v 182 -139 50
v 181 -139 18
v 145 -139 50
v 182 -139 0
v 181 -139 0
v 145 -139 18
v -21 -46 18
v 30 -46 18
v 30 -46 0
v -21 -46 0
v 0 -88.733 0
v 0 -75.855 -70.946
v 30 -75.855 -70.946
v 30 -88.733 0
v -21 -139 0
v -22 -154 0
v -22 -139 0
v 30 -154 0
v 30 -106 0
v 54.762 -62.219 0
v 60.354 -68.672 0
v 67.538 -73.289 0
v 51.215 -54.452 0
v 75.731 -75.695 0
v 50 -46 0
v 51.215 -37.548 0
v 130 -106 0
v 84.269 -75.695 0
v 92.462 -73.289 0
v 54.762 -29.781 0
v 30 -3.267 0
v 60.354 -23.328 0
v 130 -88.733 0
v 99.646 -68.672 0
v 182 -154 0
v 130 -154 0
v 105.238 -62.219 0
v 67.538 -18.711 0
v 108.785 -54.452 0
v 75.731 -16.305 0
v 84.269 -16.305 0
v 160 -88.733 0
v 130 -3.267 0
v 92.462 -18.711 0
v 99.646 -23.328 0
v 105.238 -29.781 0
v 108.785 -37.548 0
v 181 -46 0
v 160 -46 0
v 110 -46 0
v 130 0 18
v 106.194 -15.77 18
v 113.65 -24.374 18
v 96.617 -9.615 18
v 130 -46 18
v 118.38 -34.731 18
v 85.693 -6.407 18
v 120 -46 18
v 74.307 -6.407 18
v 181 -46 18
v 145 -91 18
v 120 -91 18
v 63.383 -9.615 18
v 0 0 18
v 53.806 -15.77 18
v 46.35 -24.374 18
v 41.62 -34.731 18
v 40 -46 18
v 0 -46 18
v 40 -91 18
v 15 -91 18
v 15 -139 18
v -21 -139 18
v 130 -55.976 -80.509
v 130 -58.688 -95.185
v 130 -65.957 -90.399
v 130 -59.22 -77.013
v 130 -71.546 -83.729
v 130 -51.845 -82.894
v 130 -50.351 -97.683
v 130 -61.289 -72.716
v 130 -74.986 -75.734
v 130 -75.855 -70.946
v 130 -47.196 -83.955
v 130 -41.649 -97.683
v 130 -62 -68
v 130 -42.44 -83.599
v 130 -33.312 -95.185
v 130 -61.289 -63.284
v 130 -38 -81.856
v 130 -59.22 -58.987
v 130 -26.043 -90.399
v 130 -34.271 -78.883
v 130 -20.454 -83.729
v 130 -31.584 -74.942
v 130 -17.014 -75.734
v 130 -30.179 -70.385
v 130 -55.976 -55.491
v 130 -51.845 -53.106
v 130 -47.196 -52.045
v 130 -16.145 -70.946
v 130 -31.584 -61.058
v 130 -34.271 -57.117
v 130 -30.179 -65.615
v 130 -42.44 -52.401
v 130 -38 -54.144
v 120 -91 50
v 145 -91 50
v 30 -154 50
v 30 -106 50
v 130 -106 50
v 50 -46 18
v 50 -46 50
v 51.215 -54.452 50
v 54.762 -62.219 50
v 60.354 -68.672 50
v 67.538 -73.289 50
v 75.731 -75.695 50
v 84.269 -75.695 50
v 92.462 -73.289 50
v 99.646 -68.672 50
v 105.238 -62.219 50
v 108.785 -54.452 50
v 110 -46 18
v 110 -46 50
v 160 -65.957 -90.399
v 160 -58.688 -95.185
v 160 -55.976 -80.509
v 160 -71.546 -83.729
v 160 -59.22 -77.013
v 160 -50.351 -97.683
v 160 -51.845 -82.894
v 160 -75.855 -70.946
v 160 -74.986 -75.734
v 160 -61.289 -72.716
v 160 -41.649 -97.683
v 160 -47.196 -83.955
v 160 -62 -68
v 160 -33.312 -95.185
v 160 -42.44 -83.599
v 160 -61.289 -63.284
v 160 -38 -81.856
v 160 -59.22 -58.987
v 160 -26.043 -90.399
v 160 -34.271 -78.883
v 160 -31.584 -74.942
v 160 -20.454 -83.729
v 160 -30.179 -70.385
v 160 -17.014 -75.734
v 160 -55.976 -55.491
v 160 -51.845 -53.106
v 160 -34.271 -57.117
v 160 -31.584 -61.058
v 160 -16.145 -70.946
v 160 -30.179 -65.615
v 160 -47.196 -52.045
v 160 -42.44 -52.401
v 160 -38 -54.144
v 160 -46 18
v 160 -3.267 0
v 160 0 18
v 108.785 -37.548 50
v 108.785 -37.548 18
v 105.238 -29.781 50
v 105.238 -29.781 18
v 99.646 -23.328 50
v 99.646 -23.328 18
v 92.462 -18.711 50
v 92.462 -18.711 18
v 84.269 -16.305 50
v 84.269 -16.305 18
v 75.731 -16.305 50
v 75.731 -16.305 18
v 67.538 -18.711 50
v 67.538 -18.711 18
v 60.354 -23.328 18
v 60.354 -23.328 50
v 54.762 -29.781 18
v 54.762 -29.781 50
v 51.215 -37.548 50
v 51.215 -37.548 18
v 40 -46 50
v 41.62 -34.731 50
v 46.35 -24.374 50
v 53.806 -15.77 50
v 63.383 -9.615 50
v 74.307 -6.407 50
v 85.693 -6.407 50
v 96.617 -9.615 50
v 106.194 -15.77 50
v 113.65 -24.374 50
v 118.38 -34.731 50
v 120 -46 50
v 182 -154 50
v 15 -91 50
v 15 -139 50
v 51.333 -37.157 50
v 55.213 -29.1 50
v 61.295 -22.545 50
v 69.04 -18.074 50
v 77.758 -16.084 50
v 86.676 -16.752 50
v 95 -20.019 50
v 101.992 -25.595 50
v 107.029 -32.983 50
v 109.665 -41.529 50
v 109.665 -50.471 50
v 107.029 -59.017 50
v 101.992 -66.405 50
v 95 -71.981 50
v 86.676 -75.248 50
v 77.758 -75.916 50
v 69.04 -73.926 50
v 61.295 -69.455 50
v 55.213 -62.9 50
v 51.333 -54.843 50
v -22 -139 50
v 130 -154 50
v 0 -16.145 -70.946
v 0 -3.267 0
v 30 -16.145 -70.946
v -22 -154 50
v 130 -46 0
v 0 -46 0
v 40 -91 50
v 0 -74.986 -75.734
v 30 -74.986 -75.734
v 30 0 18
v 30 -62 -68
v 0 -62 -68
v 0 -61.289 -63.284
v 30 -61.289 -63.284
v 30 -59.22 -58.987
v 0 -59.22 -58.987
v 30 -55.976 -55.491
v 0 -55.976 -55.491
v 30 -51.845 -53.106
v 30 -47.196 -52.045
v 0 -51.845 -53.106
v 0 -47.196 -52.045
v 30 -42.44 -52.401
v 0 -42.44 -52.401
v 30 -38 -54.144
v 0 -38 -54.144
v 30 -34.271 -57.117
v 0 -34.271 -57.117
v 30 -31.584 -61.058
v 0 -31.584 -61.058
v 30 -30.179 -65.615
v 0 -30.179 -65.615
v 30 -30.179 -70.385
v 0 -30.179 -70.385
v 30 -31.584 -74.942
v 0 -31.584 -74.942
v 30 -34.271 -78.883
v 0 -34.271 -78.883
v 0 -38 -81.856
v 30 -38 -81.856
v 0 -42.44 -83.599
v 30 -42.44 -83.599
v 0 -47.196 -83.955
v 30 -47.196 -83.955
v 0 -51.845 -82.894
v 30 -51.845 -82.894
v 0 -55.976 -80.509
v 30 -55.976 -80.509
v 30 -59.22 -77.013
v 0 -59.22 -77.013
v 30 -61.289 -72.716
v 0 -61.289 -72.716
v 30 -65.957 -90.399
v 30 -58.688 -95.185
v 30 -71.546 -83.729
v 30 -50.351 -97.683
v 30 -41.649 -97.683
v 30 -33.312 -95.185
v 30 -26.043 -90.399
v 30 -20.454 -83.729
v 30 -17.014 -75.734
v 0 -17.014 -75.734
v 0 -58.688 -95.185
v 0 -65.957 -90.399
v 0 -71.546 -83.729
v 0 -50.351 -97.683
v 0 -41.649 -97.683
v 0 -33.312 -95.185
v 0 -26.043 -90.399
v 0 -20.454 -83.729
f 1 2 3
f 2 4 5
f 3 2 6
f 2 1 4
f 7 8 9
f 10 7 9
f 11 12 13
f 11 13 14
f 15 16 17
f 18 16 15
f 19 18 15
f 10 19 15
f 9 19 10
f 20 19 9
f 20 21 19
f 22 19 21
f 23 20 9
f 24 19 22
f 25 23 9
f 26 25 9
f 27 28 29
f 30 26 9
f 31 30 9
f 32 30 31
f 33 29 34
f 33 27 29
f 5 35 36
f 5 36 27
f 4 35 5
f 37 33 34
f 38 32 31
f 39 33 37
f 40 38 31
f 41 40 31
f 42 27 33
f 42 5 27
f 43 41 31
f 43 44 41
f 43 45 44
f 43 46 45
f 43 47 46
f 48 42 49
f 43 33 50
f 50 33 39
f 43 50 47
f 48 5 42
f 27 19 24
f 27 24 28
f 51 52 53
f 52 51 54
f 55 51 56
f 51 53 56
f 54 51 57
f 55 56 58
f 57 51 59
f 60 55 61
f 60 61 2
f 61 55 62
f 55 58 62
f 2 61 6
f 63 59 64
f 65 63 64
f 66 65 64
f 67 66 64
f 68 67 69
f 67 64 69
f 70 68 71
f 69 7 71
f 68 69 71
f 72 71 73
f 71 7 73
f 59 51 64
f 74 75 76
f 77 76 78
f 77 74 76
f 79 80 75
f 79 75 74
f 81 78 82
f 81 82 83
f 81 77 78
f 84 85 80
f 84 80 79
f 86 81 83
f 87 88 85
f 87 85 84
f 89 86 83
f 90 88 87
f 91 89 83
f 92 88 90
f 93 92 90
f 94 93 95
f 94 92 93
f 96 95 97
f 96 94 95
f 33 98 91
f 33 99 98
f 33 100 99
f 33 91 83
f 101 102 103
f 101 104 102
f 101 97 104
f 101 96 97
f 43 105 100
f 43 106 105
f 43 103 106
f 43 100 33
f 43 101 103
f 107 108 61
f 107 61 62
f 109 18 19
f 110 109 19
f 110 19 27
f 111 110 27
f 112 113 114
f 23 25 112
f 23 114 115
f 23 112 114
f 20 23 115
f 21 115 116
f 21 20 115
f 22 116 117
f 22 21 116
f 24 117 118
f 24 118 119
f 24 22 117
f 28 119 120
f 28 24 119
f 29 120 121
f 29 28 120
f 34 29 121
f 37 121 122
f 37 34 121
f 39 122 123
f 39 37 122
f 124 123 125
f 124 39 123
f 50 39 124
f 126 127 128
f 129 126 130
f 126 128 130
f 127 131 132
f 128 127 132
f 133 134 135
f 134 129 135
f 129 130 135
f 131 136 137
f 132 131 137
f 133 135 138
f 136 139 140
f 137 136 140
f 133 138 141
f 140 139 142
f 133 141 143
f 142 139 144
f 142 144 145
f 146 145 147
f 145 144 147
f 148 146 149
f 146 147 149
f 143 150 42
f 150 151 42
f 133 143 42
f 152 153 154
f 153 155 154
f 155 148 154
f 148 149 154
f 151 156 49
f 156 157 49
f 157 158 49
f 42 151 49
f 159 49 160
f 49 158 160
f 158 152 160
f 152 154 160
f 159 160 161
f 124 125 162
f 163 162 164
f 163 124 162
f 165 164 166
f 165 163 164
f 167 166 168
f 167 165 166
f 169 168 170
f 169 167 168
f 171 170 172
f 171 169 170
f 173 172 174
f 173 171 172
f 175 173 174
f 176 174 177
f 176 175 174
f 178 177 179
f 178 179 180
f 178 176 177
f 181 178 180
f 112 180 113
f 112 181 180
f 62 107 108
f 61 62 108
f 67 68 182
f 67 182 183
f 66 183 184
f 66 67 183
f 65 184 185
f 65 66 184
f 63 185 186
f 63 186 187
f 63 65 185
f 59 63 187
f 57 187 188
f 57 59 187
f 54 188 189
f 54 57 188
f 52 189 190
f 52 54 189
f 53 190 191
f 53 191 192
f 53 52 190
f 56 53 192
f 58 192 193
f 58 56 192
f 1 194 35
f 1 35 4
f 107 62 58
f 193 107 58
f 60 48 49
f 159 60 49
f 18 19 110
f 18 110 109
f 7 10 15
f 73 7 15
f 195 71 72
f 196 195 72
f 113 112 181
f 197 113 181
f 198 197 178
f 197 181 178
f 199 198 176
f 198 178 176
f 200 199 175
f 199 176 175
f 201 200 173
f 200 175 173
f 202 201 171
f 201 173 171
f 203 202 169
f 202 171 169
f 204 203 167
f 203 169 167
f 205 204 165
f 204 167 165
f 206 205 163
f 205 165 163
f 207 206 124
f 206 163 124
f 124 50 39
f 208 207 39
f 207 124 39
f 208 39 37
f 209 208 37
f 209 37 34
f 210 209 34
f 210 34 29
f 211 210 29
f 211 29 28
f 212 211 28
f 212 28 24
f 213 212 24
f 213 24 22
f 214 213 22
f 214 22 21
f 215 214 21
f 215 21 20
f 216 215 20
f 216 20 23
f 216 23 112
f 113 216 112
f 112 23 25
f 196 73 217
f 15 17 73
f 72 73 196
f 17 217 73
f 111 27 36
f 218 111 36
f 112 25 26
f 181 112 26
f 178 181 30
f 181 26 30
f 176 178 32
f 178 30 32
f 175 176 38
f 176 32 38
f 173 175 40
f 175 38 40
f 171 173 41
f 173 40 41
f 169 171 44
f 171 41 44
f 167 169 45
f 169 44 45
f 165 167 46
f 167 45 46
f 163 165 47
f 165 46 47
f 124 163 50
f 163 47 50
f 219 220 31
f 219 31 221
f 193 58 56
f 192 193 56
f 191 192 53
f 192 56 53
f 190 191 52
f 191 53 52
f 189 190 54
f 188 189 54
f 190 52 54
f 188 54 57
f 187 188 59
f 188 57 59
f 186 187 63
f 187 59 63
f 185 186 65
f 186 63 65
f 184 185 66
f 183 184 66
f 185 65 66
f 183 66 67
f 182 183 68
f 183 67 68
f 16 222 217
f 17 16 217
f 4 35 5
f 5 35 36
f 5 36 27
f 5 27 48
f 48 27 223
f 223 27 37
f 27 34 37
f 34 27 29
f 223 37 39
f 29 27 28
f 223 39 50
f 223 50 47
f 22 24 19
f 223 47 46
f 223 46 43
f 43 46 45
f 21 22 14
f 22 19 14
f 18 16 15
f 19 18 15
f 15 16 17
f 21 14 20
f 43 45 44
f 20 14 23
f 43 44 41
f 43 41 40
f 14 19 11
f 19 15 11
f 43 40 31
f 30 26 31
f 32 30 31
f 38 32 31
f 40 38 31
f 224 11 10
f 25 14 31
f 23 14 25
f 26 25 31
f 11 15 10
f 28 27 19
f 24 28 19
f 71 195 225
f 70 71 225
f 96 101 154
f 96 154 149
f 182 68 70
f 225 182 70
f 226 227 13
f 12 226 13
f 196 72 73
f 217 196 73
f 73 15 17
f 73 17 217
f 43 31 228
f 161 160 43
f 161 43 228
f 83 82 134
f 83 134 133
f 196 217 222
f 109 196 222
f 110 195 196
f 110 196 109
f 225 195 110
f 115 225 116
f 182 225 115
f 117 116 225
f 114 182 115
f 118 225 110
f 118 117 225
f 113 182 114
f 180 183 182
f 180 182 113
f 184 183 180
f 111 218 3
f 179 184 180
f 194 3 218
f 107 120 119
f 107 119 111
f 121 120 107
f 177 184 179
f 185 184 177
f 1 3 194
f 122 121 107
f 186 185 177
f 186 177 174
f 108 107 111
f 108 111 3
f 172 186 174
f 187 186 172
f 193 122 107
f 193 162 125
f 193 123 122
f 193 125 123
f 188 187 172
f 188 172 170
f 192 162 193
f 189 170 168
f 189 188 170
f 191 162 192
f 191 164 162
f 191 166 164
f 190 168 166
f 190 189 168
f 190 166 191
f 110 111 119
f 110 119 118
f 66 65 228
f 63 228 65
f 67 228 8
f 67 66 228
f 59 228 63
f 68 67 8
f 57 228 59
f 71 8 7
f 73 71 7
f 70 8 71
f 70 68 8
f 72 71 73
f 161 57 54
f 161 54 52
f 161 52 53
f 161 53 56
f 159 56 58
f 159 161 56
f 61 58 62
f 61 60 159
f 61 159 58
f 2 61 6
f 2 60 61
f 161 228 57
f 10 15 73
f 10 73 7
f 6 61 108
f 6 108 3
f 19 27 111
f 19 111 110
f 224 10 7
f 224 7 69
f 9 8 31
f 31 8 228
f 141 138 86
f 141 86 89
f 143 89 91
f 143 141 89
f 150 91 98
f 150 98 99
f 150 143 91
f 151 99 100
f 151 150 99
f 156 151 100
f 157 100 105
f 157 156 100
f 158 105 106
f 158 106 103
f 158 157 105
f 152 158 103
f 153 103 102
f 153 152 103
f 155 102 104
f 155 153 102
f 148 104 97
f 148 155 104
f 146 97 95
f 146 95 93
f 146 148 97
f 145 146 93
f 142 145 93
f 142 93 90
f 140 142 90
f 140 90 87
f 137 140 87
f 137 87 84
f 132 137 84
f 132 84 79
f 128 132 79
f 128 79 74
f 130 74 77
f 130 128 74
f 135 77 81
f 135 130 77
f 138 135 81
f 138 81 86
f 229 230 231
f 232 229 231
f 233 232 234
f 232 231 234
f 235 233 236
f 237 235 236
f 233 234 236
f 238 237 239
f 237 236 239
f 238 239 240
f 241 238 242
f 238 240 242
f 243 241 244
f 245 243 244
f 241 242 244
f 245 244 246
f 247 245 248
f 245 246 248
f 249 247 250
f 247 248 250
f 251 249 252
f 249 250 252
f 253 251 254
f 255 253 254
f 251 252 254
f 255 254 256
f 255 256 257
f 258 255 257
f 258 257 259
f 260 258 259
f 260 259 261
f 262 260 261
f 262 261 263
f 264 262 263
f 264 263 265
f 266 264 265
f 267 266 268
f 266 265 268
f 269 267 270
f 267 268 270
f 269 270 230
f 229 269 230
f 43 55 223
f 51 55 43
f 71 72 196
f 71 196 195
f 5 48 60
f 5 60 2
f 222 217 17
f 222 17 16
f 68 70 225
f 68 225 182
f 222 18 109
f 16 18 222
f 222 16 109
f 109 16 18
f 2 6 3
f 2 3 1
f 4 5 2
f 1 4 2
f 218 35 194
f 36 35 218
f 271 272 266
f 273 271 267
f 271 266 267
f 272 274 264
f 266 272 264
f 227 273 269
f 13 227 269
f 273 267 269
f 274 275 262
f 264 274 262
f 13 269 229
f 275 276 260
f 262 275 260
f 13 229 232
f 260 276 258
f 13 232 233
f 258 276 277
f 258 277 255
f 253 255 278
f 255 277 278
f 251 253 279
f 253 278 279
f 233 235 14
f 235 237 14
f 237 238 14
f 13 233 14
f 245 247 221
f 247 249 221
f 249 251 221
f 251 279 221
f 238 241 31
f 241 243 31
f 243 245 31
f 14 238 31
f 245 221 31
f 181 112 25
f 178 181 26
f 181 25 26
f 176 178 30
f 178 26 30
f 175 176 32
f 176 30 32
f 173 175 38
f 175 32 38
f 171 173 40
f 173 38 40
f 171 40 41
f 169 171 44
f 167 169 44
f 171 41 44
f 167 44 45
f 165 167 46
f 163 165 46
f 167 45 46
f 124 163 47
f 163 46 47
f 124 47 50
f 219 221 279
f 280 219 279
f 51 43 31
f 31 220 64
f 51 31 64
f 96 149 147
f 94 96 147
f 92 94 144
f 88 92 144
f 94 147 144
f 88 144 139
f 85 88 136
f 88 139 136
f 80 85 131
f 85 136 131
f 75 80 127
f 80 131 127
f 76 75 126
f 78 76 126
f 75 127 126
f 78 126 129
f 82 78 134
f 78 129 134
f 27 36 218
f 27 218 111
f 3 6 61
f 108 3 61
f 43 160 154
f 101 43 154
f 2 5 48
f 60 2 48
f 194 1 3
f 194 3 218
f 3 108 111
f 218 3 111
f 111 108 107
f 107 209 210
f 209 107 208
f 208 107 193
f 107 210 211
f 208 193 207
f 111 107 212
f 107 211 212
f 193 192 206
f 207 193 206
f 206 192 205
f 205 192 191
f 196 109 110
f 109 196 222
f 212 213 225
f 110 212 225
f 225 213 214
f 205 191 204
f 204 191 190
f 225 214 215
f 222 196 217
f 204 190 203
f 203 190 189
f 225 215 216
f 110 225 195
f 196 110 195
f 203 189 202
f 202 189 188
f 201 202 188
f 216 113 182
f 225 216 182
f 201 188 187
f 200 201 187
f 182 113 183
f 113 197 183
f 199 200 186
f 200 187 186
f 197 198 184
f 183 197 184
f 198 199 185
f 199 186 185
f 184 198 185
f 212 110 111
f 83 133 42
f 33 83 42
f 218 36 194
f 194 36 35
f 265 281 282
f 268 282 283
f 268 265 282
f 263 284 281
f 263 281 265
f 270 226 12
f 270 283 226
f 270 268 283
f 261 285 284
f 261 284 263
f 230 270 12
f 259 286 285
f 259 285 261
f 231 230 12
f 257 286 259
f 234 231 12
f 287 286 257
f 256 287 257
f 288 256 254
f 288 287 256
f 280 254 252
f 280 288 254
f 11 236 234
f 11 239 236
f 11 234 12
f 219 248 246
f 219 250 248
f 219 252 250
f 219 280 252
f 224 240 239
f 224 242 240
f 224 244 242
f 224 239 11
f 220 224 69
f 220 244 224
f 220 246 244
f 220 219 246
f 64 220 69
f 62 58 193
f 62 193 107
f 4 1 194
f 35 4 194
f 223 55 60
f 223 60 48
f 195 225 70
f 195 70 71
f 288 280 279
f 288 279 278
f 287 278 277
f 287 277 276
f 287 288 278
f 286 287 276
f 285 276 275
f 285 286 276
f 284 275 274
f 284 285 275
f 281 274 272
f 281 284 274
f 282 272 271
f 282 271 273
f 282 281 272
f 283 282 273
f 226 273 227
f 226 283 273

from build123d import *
from build123d.topology import SkipClean

# Parameters (mm, degrees)
BOSS_EXTRUDE1_DEPTH      = 18
BOSS_EXTRUDE2_DEPTH      = 32
BOSS_EXTRUDE2_DEPTH_BACK = 18
SKETCH2_R                = 30
CUT_EXTRUDE2_DEPTH       = 244.598029549
CUT_EXTRUDE2_DEPTH_BACK  = 244.598029549
SKETCH6_W                = 18
SKETCH6_H                = 46
SKETCH4_R                = 16
BOSS_EXTRUDE3_DEPTH      = 30
LOFT1_START              = 30
LOFT1_DEPTH              = 100
BOSS_EXTRUDE4_DEPTH      = 30
SKETCH14_R               = 30
CUT_EXTRUDE3_DEPTH       = 252.475644944


# Read off the part's stored shape, not the designer's step: Loft1
with BuildPart() as part:
    # Sketch1 → Boss-Extrude1 (new body)
    with BuildSketch(Plane.XY):
        with BuildLine():
            Line((0, 0), (160, 0))
            Line((160, 0), (160, -46))
            Line((160, -46), (181, -46))
            Line((181, -46), (181, -139))
            Line((181, -139), (145, -139))
            Line((145, -139), (145, -91))
            Line((145, -91), (120, -91))
            Line((120, -91), (120, -46))
            ThreePointArc((120, -46), (80, -6), (40, -46))
            Line((40, -46), (40, -91))
            Line((40, -91), (15, -91))
            Line((15, -91), (15, -139))
            Line((15, -139), (-21, -139))
            Line((-21, -139), (-21, -46))
            Line((-21, -46), (0, -46))
            Line((0, -46), (0, 0))
        make_face()
    extrude(amount=BOSS_EXTRUDE1_DEPTH)

    # Sketch2 → Boss-Extrude2 (add, two sides: drawn at the far end of the back side and taken through both)
    with BuildSketch(Plane.XY.offset(18).offset(-BOSS_EXTRUDE2_DEPTH_BACK)):
        with BuildLine():
            Line((15, -139), (-22, -139))
            Line((-22, -139), (-22, -154))
            Line((-22, -154), (30, -154))
            Line((30, -154), (30, -106))
            Line((30, -106), (130, -106))
            Line((130, -106), (130, -154))
            Line((130, -154), (182, -154))
            Line((182, -154), (182, -139))
            Line((182, -139), (145, -139))
            Line((145, -139), (145, -91))
            Line((145, -91), (120, -91))
            Line((120, -91), (120, -46))
            ThreePointArc((120, -46), (80, -6), (40, -46))
            Line((40, -46), (40, -91))
            Line((40, -91), (15, -91))
            Line((15, -91), (15, -139))
        make_face()
        with Locations((80, -46)):
            Circle(SKETCH2_R, mode=Mode.SUBTRACT)
    extrude(amount=BOSS_EXTRUDE2_DEPTH + BOSS_EXTRUDE2_DEPTH_BACK)

    # Sketch6 → Cut-Extrude2 (cut, two sides: drawn at the far end of the back side and taken through both)
    with BuildSketch(Plane(origin=(160, 0, 0), x_dir=(0, 0, -1), z_dir=(1, 0, 0)).offset(-CUT_EXTRUDE2_DEPTH_BACK)):
        with Locations((-9, -23)):
            Rectangle(SKETCH6_W, SKETCH6_H)
    extrude(amount=CUT_EXTRUDE2_DEPTH + CUT_EXTRUDE2_DEPTH_BACK, mode=Mode.SUBTRACT)

    # Sketch4 → Boss-Extrude3 (add)
    # profile 1 of 2: a face of its own
    with BuildSketch(Plane.ZY):
        with BuildLine():
            Line((-70.946033736, -75.854997659), (18, -92))
            Line((18, -92), (18, -46))
            Line((18, -46), (0, -46))
            Line((0, -46), (0, -3.267262518))
            Line((0, -3.267262518), (-70.946033736, -16.145002341))
            Line((-70.946033736, -16.145002341), (-75.734435176, -17.014167038))
            ThreePointArc((-75.734435176, -17.014167038), (-98, -46), (-75.734435176, -74.985832962))
            Line((-75.734435176, -74.985832962), (-70.946033736, -75.854997659))
        make_face()
        with Locations(Location((-68, -46, 0), (0, 0, 270))):
            Circle(SKETCH4_R, mode=Mode.SUBTRACT)
    # profile 2 of 2: a face of its own
    with BuildSketch(Plane.ZY):
        Polygon((0, -46), (18, -46), (18, 0), (0, -3.267262518), align=None)
    extrude(amount=-BOSS_EXTRUDE3_DEPTH)

    # Loft1 outline → Loft1 (add)
    with BuildSketch(Plane.YZ.offset(LOFT1_START)):
        Polygon((-46, 0), (-3.267262518, 0), (0, 18), (-46, 18), align=None)
    extrude(amount=LOFT1_DEPTH)


with BuildPart() as body_2:
    # Sketch13 → Boss-Extrude4 (new body)
    with BuildSketch(Plane(origin=(0, 0, 0), x_dir=(-1, 0, 0), z_dir=(0, 0, -1))):
        with BuildLine():
            Line((-80, -46), (-80, -76))
            ThreePointArc((-80, -76), (-58.786796564, -67.213203436), (-50, -46))
            Line((-50, -46), (-80, -46))
        make_face()
    extrude(amount=BOSS_EXTRUDE4_DEPTH)


with BuildPart() as body_3:
    # Mirror6: mirrored copy
    add(part.part.mirror(Plane(origin=(80, -46, -30), x_dir=(0, 0, 1), z_dir=(-1, 0, 0))))


with BuildPart() as cut_extrude3_tool:
    # Sketch14 → Cut-Extrude3 (new, through all)
    with SkipClean():  # the faces are left unmerged after this step: merging them gives an invalid solid
        with BuildSketch(Plane(origin=(0, 0, -30), x_dir=(-1, 0, 0), z_dir=(0, 0, -1))):
            with Locations((-80, -46)):
                Circle(SKETCH14_R)
        extrude(amount=-CUT_EXTRUDE3_DEPTH)


with BuildPart() as part_1:
    with SkipClean():  # the faces are left unmerged after this step: merging them gives an invalid solid
        add(part.part)

        # Cut-Extrude3: cut by cut_extrude3_tool
        add(cut_extrude3_tool.part, mode=Mode.SUBTRACT)


with BuildPart() as body_2_1:
    with SkipClean():  # the faces are left unmerged after this step: merging them gives an invalid solid
        add(body_2.part)

        # Cut-Extrude3: cut by cut_extrude3_tool
        add(cut_extrude3_tool.part, mode=Mode.SUBTRACT)


with BuildPart() as body_3_1:
    with SkipClean():  # the faces are left unmerged after this step: merging them gives an invalid solid
        add(body_3.part)

        # Cut-Extrude3: cut by cut_extrude3_tool
        add(cut_extrude3_tool.part, mode=Mode.SUBTRACT)


solid = Compound([part_1.part, body_3_1.part])
